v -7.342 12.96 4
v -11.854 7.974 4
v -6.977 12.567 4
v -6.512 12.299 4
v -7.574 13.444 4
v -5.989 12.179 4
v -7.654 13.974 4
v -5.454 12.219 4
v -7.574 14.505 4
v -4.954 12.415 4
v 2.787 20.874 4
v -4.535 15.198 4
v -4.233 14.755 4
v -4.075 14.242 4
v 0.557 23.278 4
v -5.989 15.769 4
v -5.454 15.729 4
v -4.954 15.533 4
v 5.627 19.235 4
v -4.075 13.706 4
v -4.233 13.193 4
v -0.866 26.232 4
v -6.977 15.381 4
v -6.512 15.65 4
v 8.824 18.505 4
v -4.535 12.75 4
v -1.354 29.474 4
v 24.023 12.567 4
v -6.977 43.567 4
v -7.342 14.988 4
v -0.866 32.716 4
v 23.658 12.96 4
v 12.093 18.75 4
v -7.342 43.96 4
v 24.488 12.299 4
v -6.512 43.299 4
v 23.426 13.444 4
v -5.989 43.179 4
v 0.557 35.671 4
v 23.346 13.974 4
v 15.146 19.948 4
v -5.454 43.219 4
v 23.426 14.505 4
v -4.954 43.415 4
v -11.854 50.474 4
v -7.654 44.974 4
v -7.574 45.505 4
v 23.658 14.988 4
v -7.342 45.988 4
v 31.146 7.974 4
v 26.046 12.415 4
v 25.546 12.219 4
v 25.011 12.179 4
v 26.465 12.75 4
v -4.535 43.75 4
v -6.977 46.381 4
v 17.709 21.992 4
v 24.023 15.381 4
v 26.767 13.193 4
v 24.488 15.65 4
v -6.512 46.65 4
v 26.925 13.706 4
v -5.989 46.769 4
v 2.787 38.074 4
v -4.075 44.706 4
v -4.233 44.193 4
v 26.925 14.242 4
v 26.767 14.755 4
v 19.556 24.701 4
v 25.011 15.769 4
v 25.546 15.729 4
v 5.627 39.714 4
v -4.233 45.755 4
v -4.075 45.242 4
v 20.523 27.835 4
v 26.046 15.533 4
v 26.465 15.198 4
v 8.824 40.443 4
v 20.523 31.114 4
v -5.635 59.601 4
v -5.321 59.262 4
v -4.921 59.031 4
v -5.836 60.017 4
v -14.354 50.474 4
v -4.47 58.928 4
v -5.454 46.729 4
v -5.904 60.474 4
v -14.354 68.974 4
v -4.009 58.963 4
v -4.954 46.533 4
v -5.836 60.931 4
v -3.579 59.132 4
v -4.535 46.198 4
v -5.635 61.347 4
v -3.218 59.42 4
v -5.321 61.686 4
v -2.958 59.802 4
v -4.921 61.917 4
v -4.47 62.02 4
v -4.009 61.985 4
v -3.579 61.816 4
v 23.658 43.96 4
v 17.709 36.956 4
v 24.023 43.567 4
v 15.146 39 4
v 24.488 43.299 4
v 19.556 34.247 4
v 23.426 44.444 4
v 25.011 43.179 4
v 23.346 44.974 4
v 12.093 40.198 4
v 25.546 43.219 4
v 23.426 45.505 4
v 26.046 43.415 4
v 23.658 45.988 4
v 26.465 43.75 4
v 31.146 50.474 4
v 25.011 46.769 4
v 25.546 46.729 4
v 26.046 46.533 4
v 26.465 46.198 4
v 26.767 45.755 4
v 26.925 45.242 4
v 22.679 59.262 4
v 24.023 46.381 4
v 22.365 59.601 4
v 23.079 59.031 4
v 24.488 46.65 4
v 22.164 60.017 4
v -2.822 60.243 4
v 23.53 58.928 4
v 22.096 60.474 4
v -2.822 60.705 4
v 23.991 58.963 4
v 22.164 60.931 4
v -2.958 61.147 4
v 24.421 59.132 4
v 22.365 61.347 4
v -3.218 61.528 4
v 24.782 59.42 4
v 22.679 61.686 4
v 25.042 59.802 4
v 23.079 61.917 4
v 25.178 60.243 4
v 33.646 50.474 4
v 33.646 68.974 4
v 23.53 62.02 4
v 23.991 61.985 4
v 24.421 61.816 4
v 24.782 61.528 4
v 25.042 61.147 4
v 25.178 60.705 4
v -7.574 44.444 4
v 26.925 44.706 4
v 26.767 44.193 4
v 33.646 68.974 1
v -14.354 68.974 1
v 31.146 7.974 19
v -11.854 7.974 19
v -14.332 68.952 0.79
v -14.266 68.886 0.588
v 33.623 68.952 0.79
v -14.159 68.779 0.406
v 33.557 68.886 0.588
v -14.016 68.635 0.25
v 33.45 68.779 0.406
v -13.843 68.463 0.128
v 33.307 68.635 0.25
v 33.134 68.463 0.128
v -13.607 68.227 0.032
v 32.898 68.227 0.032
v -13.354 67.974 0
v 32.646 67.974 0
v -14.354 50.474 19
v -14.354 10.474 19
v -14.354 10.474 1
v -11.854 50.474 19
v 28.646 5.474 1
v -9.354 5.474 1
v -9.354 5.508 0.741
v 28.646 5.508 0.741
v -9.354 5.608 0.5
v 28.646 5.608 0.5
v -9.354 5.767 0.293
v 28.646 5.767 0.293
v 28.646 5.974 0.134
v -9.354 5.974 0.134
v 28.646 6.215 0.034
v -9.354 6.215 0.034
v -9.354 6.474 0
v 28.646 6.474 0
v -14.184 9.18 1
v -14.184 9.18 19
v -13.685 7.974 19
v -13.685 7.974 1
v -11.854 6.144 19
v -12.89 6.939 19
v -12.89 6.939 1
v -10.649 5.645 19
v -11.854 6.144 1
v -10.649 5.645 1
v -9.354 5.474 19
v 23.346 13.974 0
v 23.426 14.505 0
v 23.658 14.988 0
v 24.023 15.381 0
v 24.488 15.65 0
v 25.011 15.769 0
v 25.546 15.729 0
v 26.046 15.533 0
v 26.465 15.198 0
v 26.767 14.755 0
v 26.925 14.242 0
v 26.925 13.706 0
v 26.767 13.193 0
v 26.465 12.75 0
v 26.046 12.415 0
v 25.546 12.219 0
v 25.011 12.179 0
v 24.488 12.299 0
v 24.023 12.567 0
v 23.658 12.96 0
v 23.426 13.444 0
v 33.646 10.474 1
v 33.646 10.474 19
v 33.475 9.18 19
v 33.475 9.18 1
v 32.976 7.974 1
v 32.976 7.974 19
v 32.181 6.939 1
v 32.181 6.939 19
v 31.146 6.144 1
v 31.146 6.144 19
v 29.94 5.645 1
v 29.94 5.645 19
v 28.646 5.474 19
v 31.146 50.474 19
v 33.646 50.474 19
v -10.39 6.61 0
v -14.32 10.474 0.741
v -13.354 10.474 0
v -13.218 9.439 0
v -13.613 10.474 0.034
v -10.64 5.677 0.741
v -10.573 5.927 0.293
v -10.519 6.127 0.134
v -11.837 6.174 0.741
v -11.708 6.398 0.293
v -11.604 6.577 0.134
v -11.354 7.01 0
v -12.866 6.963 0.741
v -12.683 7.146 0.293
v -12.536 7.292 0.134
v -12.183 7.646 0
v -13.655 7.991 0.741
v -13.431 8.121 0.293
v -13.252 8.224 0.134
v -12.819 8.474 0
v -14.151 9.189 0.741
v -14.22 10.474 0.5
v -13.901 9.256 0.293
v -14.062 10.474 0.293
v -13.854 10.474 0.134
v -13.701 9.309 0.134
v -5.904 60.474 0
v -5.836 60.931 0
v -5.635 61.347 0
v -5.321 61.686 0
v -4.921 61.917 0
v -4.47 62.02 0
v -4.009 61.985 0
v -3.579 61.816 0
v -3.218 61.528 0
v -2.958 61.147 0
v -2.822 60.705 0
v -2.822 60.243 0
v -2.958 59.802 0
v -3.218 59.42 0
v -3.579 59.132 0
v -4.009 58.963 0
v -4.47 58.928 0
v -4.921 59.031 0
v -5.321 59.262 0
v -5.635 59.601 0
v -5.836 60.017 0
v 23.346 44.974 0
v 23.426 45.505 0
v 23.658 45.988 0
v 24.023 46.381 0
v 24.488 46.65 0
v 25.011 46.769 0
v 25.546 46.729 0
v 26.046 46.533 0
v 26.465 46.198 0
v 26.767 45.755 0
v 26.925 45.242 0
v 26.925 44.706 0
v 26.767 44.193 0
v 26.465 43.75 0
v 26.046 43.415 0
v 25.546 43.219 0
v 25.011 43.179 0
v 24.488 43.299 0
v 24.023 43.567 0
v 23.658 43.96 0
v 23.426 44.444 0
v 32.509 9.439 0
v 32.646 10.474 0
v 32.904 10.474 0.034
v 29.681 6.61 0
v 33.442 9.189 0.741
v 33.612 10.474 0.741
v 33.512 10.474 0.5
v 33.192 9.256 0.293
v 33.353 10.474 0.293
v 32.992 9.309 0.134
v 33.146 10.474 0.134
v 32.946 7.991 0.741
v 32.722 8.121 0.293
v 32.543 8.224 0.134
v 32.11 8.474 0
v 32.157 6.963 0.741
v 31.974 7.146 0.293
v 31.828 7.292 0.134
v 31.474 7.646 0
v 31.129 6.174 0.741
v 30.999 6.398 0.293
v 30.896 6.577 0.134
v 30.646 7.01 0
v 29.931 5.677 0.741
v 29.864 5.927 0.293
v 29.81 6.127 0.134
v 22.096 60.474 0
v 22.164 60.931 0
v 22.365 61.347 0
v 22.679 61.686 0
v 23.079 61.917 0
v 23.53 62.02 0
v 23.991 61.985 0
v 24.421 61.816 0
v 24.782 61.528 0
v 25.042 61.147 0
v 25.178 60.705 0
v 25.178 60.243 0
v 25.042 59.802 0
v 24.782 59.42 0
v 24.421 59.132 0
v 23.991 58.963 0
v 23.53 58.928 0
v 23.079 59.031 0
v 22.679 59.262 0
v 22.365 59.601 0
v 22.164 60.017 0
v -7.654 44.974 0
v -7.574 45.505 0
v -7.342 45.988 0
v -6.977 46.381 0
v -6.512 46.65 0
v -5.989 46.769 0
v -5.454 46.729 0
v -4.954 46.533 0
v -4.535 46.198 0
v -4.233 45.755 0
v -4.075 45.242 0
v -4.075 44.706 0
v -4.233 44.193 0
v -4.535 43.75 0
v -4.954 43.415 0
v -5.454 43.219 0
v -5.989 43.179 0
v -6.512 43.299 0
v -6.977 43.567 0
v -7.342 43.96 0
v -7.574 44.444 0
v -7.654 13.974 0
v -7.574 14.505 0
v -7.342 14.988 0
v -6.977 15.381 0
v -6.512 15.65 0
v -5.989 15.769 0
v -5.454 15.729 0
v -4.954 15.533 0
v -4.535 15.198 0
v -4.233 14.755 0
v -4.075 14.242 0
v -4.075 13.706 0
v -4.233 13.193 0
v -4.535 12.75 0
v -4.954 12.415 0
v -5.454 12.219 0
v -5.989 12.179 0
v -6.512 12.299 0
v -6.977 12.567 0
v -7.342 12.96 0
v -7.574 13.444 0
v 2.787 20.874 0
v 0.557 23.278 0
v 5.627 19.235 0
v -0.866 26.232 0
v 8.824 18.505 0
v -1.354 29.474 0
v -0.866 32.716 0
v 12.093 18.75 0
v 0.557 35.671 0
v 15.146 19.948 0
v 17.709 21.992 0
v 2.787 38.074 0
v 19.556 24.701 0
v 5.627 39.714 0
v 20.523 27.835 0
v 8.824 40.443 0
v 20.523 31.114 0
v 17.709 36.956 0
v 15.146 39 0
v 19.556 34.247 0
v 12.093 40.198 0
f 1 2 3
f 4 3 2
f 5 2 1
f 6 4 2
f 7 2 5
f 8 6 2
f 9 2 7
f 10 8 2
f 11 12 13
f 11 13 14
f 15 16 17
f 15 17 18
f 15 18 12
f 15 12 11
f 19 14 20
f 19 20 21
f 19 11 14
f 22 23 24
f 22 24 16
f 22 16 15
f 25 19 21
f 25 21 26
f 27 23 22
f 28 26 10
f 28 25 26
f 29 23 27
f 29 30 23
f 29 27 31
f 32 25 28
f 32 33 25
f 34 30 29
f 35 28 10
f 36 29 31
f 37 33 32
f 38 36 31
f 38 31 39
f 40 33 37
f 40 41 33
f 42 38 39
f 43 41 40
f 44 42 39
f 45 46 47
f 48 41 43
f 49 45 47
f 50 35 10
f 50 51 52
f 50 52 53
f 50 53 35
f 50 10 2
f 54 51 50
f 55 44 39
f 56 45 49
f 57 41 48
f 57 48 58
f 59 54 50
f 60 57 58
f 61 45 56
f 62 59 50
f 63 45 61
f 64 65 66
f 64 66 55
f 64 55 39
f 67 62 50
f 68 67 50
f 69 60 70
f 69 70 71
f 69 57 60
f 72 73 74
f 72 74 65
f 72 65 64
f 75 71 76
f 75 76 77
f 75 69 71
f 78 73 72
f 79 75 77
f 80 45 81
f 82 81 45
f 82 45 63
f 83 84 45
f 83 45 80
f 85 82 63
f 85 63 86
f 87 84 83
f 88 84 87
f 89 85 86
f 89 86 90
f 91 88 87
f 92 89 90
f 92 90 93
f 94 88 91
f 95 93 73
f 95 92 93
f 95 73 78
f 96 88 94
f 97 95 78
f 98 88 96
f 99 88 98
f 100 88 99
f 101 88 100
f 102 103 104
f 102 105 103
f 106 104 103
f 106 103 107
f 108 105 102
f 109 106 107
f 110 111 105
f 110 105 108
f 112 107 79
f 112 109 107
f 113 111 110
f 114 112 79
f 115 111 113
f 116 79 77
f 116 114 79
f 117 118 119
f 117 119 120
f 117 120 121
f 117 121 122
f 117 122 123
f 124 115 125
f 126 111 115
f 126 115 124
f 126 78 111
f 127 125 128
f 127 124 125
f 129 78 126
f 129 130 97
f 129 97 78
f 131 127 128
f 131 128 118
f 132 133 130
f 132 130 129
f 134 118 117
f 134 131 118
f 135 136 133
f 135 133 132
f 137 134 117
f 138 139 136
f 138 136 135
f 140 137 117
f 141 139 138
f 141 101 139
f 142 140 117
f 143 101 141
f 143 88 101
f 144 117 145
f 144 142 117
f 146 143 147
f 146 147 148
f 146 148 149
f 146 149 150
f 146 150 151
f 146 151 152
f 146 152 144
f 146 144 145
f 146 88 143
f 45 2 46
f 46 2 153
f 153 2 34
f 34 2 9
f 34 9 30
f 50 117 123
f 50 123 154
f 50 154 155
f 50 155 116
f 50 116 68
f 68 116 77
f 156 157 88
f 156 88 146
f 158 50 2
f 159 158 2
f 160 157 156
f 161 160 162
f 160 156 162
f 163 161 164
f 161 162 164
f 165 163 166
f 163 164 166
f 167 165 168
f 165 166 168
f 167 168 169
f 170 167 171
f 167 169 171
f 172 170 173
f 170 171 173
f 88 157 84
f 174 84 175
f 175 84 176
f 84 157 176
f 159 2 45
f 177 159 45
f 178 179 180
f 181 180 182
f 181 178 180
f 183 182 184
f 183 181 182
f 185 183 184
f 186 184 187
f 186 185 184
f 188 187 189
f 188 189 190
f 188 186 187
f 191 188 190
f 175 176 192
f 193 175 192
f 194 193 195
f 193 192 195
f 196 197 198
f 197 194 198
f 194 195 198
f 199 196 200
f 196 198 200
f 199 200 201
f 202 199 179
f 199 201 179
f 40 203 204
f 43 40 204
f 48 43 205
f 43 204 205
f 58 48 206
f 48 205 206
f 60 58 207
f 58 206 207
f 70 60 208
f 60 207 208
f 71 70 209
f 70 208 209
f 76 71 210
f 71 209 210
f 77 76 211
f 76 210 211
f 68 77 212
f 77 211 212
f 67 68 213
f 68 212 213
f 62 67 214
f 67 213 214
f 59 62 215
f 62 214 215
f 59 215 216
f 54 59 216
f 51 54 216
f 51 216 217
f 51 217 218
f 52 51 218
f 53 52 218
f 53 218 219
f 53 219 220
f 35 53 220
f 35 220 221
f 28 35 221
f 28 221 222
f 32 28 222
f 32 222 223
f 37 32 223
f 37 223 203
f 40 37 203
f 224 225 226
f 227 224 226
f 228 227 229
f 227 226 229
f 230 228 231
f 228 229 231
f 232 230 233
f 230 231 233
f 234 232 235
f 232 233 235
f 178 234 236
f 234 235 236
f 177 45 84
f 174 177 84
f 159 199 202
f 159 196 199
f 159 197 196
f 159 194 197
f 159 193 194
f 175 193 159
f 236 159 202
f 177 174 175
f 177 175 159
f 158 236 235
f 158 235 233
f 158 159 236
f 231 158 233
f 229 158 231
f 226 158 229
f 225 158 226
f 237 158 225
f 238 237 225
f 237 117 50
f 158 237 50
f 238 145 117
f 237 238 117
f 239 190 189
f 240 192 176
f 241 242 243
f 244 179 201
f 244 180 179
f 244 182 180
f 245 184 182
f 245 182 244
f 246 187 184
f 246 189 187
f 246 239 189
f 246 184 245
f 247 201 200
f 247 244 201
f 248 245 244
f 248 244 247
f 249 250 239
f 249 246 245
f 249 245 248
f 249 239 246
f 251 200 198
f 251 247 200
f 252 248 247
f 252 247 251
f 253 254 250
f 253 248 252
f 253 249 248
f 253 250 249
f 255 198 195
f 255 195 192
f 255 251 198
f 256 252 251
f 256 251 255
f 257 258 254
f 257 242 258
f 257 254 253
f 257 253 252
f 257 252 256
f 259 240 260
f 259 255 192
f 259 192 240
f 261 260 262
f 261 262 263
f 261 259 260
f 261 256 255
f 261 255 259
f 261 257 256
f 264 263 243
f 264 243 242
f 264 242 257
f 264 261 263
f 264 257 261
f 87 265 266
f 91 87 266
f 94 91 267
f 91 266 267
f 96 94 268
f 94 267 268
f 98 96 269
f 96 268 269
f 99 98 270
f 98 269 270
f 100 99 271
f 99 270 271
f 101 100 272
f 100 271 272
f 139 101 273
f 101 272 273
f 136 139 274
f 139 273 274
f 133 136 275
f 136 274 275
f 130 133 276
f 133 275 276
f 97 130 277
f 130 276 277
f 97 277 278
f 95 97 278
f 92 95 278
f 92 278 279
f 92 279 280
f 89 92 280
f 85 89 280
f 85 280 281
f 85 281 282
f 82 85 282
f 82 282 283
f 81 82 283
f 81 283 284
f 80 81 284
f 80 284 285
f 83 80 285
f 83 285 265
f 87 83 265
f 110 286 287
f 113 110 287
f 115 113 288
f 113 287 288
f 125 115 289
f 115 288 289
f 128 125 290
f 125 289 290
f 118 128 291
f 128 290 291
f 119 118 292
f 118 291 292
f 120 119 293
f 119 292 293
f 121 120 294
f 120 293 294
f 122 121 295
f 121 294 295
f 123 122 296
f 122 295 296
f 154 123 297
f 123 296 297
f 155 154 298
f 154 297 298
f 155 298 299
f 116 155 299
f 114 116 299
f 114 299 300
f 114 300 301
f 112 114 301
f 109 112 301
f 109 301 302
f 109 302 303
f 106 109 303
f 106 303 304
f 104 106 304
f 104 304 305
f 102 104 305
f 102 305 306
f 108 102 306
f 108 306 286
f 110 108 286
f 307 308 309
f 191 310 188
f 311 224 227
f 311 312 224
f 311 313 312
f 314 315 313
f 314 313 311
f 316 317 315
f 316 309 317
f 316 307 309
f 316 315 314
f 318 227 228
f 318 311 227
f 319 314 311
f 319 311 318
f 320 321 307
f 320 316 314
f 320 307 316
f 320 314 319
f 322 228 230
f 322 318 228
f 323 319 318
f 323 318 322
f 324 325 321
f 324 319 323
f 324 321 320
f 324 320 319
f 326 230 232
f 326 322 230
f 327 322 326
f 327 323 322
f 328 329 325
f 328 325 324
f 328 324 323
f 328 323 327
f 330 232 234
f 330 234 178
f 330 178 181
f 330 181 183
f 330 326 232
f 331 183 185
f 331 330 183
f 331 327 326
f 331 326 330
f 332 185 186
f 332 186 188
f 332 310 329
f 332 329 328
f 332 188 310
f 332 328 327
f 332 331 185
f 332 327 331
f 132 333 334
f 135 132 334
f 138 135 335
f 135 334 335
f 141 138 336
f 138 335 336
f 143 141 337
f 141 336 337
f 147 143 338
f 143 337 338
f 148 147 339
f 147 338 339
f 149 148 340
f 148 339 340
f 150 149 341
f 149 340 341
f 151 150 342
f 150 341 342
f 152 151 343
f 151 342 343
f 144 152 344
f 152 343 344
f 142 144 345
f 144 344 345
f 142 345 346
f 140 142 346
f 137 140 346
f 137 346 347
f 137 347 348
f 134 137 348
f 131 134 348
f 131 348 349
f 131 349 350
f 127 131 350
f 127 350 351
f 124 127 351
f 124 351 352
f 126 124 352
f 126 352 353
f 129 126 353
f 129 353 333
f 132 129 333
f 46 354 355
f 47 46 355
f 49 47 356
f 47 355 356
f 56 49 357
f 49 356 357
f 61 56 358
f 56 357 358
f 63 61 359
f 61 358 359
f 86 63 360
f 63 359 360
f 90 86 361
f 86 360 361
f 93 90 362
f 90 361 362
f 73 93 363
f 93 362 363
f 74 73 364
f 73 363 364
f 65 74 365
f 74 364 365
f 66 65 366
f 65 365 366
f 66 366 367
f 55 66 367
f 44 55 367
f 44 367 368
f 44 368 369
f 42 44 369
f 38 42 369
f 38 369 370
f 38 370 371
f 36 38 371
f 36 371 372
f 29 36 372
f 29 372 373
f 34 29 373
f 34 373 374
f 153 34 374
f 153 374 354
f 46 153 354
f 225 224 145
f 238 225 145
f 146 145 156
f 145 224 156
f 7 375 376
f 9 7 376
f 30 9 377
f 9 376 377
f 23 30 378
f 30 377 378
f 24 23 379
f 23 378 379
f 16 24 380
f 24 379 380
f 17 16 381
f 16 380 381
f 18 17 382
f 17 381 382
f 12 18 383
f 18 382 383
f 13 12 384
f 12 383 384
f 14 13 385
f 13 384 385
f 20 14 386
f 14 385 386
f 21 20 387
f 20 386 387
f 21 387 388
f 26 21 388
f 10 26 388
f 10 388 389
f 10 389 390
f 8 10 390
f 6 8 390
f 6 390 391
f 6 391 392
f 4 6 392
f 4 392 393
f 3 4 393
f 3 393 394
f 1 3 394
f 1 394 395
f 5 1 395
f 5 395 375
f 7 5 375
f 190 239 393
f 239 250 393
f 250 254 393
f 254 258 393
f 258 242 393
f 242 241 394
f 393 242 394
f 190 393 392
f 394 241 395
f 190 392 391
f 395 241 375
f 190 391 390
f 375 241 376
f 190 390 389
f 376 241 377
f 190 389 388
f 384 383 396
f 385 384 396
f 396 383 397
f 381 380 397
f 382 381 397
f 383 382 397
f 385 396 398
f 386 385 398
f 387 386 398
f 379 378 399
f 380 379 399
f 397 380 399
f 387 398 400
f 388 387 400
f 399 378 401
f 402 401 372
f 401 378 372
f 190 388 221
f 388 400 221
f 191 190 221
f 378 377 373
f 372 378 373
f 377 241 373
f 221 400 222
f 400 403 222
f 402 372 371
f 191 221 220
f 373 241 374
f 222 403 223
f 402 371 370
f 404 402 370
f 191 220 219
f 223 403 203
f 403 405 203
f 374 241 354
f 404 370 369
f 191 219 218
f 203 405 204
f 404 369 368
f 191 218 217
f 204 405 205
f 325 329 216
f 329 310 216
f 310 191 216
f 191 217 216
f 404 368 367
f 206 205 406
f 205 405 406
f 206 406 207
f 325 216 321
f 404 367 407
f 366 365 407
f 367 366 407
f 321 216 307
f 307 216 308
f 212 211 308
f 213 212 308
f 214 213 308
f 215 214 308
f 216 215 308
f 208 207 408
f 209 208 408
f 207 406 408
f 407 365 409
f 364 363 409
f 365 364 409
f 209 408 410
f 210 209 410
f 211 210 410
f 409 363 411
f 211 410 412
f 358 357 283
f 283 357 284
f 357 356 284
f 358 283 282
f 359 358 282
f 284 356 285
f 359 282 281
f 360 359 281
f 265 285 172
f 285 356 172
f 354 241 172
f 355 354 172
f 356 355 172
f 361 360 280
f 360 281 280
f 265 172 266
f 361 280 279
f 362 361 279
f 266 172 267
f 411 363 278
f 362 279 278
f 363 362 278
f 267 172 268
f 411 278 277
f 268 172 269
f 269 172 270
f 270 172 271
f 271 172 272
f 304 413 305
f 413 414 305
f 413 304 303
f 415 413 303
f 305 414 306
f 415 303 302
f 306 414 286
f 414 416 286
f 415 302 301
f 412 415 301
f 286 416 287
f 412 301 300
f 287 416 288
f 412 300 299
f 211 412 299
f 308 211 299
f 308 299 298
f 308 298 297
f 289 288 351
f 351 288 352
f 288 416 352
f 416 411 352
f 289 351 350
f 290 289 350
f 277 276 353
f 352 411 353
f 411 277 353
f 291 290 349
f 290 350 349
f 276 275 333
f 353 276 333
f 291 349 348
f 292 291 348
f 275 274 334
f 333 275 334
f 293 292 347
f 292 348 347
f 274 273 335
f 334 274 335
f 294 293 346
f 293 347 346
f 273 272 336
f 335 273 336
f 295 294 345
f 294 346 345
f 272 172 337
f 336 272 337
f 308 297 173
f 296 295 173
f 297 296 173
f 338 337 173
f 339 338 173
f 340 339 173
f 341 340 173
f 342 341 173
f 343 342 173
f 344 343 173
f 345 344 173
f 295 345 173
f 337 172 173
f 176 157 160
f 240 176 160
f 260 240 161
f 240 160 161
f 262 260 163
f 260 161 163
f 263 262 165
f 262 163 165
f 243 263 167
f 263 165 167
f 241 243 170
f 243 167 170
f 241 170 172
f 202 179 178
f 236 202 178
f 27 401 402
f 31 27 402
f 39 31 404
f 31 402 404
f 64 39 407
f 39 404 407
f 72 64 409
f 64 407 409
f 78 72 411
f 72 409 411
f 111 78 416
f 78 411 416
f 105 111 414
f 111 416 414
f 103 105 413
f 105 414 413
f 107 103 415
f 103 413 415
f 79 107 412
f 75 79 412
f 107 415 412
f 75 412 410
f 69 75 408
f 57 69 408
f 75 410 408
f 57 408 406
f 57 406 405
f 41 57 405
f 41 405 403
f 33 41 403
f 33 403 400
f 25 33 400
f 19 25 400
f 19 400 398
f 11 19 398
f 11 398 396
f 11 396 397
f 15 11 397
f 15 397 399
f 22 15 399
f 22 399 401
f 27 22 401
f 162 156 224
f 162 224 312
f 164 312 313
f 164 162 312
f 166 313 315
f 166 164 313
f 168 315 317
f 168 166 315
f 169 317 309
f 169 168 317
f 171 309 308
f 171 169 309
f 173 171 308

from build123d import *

# Parameters (mm, degrees)
ESQUISSE1_W                     = 48
ESQUISSE1_H                     = 63.5
BOSS_EXTRU_1_DEPTH              = 4
CONG_1_R                        = 1
DIAM_TRE_DU_PER_AGE_22_0_22_1_D = 22
D_GAGEMENT_M31_D                = 3.6
R_P_TITION_LIN_AIRE1_COUNT      = 2
R_P_TITION_LIN_AIRE1_PITCH      = 31
R_P_TITION_LIN_AIRE2_COUNT      = 2
R_P_TITION_LIN_AIRE2_PITCH      = 31
R_P_TITION_LIN_AIRE2_COPY_1_D   = 3.6
D_GAGEMENT_M2_54_D              = 3.1
ESQUISSE19_W                    = 18.410058986
ESQUISSE19_H                    = 2.5
ESQUISSE19_W_2                  = 24.589941014
BOSS_EXTRU_2_DEPTH              = 15
CONG_2_R                        = 5


with BuildPart() as part:
    # Esquisse1 → Boss.-Extru.1 (new body)
    with BuildSketch(Plane.XY):
        with Locations((9.64559387, 37.224137931)):
            Rectangle(ESQUISSE1_W, ESQUISSE1_H)
    extrude(amount=BOSS_EXTRU_1_DEPTH)

    # Congé1
    cong_1_edges = [part.edges().sort_by_distance(p)[0] for p in [
        (9.64559387, 68.974137931, 0),
        (33.64559387, 37.224137931, 0),
        (9.64559387, 5.474137931, 0),
        (-14.35440613, 37.224137931, 0),
    ]]
    fillet(cong_1_edges, radius=CONG_1_R)

    # Diamètre du perçage Ø22.0 (22)1 (through all)
    with Locations(Plane.XY.offset(4)):
        with Locations((9.64559387, 29.474137931)):
            Hole(DIAM_TRE_DU_PER_AGE_22_0_22_1_D / 2)

    # Dégagement M31 (through all)
    with Locations(Plane.XY.offset(4)):
        with Locations((-5.85440613, 44.974137931)):
            d_gagement_m31 = Hole(D_GAGEMENT_M31_D / 2)

    # Répétition linéaire1: Dégagement M31 ×2
    with Locations(*[(i * R_P_TITION_LIN_AIRE1_PITCH, 0, 0) for i in range(1, R_P_TITION_LIN_AIRE1_COUNT)]):
        add(d_gagement_m31, mode=Mode.SUBTRACT)

    # Répétition linéaire2: Dégagement M31 ×2
    with Locations(*[(0, -i * R_P_TITION_LIN_AIRE2_PITCH, 0) for i in range(1, R_P_TITION_LIN_AIRE2_COUNT)]):
        add(d_gagement_m31, mode=Mode.SUBTRACT)

    # Répétition linéaire2 copy 1 (through all)
    with Locations(Plane(origin=(31, -31, 4), x_dir=(1, 0, 0), z_dir=(0, 0, 1))):
        with Locations((-5.85440613, 44.974137931)):
            Hole(R_P_TITION_LIN_AIRE2_COPY_1_D / 2)

    # Dégagement M2.54 (through all)
    with Locations(Plane.XY.offset(4)):
        with Locations((-4.35440613, 60.474137931), (23.64559387, 60.474137931)):
            Hole(D_GAGEMENT_M2_54_D / 2)

    # Esquisse19 → Boss.-Extru.2 (add)
    with BuildSketch(Plane.XY.offset(4)):
        Polygon((-14.35440613, 50.474137931), (-14.35440613, 5.474137931), (-11.85440613, 5.474137931), (-11.85440613, 7.974137931), (-11.85440613, 50.474137931), align=None)
        with Locations((-2.649376637, 6.724137931)):
            Rectangle(ESQUISSE19_W, ESQUISSE19_H)
        with Locations((18.850623363, 6.724137931)):
            Rectangle(ESQUISSE19_W_2, ESQUISSE19_H)
        Polygon((31.14559387, 7.974137931), (31.14559387, 5.474137931), (33.64559387, 5.474137931), (33.64559387, 50.474137931), (31.14559387, 50.474137931), align=None)
    extrude(amount=BOSS_EXTRU_2_DEPTH)

    # Congé2
    # the kernel refuses this fillet: 5 mm, written as the material it takes off along each edge
    with BuildSketch(Plane(origin=(-9.35440613, 10.474137931, 0), x_dir=(0, -1, 0), z_dir=(1, 0, 0))) as cong_2_piece_1:
        with BuildLine():
            CenterArc((4, -1), 1, 0, 90)
            Line((5, -1), (5, 0))
            Line((5, 0), (4, 0))
        make_face()
    revolve(axis=Axis((-9.35440613, 10.474137931, 0), (0, 0, -1)), revolution_arc=90, mode=Mode.SUBTRACT)
    with BuildSketch(Plane(origin=(28.64559387, 10.474137931, 0), x_dir=(1, 0, 0), z_dir=(0, 1, 0))) as cong_2_piece_2:
        with BuildLine():
            CenterArc((4, -1), 1, 0, 90)
            Line((5, -1), (5, 0))
            Line((5, 0), (4, 0))
        make_face()
    revolve(axis=Axis((28.64559387, 10.474137931, 0), (0, 0, -1)), revolution_arc=90, mode=Mode.SUBTRACT)
    with BuildSketch(Plane(origin=(33.64559387, 5.474137931, 31.5), x_dir=(0, 1, 0), z_dir=(0, 0, -1))) as cong_2_piece_3:
        with BuildLine():
            CenterArc((CONG_2_R, -CONG_2_R), CONG_2_R, 90, 90)
            Line((0, -CONG_2_R), (0, 0))
            Line((0, 0), (CONG_2_R, 0))
        make_face()
    extrude(amount=31.5, mode=Mode.SUBTRACT)
    with BuildSketch(Plane(origin=(-14.35440613, 5.474137931, 0), x_dir=(1, 0, 0), z_dir=(0, 0, 1))) as cong_2_piece_4:
        with BuildLine():
            CenterArc((CONG_2_R, CONG_2_R), CONG_2_R, 180, 90)
            Line((0, CONG_2_R), (0, 0))
            Line((0, 0), (CONG_2_R, 0))
        make_face()
    extrude(amount=31.5, mode=Mode.SUBTRACT)


solid = part.part
